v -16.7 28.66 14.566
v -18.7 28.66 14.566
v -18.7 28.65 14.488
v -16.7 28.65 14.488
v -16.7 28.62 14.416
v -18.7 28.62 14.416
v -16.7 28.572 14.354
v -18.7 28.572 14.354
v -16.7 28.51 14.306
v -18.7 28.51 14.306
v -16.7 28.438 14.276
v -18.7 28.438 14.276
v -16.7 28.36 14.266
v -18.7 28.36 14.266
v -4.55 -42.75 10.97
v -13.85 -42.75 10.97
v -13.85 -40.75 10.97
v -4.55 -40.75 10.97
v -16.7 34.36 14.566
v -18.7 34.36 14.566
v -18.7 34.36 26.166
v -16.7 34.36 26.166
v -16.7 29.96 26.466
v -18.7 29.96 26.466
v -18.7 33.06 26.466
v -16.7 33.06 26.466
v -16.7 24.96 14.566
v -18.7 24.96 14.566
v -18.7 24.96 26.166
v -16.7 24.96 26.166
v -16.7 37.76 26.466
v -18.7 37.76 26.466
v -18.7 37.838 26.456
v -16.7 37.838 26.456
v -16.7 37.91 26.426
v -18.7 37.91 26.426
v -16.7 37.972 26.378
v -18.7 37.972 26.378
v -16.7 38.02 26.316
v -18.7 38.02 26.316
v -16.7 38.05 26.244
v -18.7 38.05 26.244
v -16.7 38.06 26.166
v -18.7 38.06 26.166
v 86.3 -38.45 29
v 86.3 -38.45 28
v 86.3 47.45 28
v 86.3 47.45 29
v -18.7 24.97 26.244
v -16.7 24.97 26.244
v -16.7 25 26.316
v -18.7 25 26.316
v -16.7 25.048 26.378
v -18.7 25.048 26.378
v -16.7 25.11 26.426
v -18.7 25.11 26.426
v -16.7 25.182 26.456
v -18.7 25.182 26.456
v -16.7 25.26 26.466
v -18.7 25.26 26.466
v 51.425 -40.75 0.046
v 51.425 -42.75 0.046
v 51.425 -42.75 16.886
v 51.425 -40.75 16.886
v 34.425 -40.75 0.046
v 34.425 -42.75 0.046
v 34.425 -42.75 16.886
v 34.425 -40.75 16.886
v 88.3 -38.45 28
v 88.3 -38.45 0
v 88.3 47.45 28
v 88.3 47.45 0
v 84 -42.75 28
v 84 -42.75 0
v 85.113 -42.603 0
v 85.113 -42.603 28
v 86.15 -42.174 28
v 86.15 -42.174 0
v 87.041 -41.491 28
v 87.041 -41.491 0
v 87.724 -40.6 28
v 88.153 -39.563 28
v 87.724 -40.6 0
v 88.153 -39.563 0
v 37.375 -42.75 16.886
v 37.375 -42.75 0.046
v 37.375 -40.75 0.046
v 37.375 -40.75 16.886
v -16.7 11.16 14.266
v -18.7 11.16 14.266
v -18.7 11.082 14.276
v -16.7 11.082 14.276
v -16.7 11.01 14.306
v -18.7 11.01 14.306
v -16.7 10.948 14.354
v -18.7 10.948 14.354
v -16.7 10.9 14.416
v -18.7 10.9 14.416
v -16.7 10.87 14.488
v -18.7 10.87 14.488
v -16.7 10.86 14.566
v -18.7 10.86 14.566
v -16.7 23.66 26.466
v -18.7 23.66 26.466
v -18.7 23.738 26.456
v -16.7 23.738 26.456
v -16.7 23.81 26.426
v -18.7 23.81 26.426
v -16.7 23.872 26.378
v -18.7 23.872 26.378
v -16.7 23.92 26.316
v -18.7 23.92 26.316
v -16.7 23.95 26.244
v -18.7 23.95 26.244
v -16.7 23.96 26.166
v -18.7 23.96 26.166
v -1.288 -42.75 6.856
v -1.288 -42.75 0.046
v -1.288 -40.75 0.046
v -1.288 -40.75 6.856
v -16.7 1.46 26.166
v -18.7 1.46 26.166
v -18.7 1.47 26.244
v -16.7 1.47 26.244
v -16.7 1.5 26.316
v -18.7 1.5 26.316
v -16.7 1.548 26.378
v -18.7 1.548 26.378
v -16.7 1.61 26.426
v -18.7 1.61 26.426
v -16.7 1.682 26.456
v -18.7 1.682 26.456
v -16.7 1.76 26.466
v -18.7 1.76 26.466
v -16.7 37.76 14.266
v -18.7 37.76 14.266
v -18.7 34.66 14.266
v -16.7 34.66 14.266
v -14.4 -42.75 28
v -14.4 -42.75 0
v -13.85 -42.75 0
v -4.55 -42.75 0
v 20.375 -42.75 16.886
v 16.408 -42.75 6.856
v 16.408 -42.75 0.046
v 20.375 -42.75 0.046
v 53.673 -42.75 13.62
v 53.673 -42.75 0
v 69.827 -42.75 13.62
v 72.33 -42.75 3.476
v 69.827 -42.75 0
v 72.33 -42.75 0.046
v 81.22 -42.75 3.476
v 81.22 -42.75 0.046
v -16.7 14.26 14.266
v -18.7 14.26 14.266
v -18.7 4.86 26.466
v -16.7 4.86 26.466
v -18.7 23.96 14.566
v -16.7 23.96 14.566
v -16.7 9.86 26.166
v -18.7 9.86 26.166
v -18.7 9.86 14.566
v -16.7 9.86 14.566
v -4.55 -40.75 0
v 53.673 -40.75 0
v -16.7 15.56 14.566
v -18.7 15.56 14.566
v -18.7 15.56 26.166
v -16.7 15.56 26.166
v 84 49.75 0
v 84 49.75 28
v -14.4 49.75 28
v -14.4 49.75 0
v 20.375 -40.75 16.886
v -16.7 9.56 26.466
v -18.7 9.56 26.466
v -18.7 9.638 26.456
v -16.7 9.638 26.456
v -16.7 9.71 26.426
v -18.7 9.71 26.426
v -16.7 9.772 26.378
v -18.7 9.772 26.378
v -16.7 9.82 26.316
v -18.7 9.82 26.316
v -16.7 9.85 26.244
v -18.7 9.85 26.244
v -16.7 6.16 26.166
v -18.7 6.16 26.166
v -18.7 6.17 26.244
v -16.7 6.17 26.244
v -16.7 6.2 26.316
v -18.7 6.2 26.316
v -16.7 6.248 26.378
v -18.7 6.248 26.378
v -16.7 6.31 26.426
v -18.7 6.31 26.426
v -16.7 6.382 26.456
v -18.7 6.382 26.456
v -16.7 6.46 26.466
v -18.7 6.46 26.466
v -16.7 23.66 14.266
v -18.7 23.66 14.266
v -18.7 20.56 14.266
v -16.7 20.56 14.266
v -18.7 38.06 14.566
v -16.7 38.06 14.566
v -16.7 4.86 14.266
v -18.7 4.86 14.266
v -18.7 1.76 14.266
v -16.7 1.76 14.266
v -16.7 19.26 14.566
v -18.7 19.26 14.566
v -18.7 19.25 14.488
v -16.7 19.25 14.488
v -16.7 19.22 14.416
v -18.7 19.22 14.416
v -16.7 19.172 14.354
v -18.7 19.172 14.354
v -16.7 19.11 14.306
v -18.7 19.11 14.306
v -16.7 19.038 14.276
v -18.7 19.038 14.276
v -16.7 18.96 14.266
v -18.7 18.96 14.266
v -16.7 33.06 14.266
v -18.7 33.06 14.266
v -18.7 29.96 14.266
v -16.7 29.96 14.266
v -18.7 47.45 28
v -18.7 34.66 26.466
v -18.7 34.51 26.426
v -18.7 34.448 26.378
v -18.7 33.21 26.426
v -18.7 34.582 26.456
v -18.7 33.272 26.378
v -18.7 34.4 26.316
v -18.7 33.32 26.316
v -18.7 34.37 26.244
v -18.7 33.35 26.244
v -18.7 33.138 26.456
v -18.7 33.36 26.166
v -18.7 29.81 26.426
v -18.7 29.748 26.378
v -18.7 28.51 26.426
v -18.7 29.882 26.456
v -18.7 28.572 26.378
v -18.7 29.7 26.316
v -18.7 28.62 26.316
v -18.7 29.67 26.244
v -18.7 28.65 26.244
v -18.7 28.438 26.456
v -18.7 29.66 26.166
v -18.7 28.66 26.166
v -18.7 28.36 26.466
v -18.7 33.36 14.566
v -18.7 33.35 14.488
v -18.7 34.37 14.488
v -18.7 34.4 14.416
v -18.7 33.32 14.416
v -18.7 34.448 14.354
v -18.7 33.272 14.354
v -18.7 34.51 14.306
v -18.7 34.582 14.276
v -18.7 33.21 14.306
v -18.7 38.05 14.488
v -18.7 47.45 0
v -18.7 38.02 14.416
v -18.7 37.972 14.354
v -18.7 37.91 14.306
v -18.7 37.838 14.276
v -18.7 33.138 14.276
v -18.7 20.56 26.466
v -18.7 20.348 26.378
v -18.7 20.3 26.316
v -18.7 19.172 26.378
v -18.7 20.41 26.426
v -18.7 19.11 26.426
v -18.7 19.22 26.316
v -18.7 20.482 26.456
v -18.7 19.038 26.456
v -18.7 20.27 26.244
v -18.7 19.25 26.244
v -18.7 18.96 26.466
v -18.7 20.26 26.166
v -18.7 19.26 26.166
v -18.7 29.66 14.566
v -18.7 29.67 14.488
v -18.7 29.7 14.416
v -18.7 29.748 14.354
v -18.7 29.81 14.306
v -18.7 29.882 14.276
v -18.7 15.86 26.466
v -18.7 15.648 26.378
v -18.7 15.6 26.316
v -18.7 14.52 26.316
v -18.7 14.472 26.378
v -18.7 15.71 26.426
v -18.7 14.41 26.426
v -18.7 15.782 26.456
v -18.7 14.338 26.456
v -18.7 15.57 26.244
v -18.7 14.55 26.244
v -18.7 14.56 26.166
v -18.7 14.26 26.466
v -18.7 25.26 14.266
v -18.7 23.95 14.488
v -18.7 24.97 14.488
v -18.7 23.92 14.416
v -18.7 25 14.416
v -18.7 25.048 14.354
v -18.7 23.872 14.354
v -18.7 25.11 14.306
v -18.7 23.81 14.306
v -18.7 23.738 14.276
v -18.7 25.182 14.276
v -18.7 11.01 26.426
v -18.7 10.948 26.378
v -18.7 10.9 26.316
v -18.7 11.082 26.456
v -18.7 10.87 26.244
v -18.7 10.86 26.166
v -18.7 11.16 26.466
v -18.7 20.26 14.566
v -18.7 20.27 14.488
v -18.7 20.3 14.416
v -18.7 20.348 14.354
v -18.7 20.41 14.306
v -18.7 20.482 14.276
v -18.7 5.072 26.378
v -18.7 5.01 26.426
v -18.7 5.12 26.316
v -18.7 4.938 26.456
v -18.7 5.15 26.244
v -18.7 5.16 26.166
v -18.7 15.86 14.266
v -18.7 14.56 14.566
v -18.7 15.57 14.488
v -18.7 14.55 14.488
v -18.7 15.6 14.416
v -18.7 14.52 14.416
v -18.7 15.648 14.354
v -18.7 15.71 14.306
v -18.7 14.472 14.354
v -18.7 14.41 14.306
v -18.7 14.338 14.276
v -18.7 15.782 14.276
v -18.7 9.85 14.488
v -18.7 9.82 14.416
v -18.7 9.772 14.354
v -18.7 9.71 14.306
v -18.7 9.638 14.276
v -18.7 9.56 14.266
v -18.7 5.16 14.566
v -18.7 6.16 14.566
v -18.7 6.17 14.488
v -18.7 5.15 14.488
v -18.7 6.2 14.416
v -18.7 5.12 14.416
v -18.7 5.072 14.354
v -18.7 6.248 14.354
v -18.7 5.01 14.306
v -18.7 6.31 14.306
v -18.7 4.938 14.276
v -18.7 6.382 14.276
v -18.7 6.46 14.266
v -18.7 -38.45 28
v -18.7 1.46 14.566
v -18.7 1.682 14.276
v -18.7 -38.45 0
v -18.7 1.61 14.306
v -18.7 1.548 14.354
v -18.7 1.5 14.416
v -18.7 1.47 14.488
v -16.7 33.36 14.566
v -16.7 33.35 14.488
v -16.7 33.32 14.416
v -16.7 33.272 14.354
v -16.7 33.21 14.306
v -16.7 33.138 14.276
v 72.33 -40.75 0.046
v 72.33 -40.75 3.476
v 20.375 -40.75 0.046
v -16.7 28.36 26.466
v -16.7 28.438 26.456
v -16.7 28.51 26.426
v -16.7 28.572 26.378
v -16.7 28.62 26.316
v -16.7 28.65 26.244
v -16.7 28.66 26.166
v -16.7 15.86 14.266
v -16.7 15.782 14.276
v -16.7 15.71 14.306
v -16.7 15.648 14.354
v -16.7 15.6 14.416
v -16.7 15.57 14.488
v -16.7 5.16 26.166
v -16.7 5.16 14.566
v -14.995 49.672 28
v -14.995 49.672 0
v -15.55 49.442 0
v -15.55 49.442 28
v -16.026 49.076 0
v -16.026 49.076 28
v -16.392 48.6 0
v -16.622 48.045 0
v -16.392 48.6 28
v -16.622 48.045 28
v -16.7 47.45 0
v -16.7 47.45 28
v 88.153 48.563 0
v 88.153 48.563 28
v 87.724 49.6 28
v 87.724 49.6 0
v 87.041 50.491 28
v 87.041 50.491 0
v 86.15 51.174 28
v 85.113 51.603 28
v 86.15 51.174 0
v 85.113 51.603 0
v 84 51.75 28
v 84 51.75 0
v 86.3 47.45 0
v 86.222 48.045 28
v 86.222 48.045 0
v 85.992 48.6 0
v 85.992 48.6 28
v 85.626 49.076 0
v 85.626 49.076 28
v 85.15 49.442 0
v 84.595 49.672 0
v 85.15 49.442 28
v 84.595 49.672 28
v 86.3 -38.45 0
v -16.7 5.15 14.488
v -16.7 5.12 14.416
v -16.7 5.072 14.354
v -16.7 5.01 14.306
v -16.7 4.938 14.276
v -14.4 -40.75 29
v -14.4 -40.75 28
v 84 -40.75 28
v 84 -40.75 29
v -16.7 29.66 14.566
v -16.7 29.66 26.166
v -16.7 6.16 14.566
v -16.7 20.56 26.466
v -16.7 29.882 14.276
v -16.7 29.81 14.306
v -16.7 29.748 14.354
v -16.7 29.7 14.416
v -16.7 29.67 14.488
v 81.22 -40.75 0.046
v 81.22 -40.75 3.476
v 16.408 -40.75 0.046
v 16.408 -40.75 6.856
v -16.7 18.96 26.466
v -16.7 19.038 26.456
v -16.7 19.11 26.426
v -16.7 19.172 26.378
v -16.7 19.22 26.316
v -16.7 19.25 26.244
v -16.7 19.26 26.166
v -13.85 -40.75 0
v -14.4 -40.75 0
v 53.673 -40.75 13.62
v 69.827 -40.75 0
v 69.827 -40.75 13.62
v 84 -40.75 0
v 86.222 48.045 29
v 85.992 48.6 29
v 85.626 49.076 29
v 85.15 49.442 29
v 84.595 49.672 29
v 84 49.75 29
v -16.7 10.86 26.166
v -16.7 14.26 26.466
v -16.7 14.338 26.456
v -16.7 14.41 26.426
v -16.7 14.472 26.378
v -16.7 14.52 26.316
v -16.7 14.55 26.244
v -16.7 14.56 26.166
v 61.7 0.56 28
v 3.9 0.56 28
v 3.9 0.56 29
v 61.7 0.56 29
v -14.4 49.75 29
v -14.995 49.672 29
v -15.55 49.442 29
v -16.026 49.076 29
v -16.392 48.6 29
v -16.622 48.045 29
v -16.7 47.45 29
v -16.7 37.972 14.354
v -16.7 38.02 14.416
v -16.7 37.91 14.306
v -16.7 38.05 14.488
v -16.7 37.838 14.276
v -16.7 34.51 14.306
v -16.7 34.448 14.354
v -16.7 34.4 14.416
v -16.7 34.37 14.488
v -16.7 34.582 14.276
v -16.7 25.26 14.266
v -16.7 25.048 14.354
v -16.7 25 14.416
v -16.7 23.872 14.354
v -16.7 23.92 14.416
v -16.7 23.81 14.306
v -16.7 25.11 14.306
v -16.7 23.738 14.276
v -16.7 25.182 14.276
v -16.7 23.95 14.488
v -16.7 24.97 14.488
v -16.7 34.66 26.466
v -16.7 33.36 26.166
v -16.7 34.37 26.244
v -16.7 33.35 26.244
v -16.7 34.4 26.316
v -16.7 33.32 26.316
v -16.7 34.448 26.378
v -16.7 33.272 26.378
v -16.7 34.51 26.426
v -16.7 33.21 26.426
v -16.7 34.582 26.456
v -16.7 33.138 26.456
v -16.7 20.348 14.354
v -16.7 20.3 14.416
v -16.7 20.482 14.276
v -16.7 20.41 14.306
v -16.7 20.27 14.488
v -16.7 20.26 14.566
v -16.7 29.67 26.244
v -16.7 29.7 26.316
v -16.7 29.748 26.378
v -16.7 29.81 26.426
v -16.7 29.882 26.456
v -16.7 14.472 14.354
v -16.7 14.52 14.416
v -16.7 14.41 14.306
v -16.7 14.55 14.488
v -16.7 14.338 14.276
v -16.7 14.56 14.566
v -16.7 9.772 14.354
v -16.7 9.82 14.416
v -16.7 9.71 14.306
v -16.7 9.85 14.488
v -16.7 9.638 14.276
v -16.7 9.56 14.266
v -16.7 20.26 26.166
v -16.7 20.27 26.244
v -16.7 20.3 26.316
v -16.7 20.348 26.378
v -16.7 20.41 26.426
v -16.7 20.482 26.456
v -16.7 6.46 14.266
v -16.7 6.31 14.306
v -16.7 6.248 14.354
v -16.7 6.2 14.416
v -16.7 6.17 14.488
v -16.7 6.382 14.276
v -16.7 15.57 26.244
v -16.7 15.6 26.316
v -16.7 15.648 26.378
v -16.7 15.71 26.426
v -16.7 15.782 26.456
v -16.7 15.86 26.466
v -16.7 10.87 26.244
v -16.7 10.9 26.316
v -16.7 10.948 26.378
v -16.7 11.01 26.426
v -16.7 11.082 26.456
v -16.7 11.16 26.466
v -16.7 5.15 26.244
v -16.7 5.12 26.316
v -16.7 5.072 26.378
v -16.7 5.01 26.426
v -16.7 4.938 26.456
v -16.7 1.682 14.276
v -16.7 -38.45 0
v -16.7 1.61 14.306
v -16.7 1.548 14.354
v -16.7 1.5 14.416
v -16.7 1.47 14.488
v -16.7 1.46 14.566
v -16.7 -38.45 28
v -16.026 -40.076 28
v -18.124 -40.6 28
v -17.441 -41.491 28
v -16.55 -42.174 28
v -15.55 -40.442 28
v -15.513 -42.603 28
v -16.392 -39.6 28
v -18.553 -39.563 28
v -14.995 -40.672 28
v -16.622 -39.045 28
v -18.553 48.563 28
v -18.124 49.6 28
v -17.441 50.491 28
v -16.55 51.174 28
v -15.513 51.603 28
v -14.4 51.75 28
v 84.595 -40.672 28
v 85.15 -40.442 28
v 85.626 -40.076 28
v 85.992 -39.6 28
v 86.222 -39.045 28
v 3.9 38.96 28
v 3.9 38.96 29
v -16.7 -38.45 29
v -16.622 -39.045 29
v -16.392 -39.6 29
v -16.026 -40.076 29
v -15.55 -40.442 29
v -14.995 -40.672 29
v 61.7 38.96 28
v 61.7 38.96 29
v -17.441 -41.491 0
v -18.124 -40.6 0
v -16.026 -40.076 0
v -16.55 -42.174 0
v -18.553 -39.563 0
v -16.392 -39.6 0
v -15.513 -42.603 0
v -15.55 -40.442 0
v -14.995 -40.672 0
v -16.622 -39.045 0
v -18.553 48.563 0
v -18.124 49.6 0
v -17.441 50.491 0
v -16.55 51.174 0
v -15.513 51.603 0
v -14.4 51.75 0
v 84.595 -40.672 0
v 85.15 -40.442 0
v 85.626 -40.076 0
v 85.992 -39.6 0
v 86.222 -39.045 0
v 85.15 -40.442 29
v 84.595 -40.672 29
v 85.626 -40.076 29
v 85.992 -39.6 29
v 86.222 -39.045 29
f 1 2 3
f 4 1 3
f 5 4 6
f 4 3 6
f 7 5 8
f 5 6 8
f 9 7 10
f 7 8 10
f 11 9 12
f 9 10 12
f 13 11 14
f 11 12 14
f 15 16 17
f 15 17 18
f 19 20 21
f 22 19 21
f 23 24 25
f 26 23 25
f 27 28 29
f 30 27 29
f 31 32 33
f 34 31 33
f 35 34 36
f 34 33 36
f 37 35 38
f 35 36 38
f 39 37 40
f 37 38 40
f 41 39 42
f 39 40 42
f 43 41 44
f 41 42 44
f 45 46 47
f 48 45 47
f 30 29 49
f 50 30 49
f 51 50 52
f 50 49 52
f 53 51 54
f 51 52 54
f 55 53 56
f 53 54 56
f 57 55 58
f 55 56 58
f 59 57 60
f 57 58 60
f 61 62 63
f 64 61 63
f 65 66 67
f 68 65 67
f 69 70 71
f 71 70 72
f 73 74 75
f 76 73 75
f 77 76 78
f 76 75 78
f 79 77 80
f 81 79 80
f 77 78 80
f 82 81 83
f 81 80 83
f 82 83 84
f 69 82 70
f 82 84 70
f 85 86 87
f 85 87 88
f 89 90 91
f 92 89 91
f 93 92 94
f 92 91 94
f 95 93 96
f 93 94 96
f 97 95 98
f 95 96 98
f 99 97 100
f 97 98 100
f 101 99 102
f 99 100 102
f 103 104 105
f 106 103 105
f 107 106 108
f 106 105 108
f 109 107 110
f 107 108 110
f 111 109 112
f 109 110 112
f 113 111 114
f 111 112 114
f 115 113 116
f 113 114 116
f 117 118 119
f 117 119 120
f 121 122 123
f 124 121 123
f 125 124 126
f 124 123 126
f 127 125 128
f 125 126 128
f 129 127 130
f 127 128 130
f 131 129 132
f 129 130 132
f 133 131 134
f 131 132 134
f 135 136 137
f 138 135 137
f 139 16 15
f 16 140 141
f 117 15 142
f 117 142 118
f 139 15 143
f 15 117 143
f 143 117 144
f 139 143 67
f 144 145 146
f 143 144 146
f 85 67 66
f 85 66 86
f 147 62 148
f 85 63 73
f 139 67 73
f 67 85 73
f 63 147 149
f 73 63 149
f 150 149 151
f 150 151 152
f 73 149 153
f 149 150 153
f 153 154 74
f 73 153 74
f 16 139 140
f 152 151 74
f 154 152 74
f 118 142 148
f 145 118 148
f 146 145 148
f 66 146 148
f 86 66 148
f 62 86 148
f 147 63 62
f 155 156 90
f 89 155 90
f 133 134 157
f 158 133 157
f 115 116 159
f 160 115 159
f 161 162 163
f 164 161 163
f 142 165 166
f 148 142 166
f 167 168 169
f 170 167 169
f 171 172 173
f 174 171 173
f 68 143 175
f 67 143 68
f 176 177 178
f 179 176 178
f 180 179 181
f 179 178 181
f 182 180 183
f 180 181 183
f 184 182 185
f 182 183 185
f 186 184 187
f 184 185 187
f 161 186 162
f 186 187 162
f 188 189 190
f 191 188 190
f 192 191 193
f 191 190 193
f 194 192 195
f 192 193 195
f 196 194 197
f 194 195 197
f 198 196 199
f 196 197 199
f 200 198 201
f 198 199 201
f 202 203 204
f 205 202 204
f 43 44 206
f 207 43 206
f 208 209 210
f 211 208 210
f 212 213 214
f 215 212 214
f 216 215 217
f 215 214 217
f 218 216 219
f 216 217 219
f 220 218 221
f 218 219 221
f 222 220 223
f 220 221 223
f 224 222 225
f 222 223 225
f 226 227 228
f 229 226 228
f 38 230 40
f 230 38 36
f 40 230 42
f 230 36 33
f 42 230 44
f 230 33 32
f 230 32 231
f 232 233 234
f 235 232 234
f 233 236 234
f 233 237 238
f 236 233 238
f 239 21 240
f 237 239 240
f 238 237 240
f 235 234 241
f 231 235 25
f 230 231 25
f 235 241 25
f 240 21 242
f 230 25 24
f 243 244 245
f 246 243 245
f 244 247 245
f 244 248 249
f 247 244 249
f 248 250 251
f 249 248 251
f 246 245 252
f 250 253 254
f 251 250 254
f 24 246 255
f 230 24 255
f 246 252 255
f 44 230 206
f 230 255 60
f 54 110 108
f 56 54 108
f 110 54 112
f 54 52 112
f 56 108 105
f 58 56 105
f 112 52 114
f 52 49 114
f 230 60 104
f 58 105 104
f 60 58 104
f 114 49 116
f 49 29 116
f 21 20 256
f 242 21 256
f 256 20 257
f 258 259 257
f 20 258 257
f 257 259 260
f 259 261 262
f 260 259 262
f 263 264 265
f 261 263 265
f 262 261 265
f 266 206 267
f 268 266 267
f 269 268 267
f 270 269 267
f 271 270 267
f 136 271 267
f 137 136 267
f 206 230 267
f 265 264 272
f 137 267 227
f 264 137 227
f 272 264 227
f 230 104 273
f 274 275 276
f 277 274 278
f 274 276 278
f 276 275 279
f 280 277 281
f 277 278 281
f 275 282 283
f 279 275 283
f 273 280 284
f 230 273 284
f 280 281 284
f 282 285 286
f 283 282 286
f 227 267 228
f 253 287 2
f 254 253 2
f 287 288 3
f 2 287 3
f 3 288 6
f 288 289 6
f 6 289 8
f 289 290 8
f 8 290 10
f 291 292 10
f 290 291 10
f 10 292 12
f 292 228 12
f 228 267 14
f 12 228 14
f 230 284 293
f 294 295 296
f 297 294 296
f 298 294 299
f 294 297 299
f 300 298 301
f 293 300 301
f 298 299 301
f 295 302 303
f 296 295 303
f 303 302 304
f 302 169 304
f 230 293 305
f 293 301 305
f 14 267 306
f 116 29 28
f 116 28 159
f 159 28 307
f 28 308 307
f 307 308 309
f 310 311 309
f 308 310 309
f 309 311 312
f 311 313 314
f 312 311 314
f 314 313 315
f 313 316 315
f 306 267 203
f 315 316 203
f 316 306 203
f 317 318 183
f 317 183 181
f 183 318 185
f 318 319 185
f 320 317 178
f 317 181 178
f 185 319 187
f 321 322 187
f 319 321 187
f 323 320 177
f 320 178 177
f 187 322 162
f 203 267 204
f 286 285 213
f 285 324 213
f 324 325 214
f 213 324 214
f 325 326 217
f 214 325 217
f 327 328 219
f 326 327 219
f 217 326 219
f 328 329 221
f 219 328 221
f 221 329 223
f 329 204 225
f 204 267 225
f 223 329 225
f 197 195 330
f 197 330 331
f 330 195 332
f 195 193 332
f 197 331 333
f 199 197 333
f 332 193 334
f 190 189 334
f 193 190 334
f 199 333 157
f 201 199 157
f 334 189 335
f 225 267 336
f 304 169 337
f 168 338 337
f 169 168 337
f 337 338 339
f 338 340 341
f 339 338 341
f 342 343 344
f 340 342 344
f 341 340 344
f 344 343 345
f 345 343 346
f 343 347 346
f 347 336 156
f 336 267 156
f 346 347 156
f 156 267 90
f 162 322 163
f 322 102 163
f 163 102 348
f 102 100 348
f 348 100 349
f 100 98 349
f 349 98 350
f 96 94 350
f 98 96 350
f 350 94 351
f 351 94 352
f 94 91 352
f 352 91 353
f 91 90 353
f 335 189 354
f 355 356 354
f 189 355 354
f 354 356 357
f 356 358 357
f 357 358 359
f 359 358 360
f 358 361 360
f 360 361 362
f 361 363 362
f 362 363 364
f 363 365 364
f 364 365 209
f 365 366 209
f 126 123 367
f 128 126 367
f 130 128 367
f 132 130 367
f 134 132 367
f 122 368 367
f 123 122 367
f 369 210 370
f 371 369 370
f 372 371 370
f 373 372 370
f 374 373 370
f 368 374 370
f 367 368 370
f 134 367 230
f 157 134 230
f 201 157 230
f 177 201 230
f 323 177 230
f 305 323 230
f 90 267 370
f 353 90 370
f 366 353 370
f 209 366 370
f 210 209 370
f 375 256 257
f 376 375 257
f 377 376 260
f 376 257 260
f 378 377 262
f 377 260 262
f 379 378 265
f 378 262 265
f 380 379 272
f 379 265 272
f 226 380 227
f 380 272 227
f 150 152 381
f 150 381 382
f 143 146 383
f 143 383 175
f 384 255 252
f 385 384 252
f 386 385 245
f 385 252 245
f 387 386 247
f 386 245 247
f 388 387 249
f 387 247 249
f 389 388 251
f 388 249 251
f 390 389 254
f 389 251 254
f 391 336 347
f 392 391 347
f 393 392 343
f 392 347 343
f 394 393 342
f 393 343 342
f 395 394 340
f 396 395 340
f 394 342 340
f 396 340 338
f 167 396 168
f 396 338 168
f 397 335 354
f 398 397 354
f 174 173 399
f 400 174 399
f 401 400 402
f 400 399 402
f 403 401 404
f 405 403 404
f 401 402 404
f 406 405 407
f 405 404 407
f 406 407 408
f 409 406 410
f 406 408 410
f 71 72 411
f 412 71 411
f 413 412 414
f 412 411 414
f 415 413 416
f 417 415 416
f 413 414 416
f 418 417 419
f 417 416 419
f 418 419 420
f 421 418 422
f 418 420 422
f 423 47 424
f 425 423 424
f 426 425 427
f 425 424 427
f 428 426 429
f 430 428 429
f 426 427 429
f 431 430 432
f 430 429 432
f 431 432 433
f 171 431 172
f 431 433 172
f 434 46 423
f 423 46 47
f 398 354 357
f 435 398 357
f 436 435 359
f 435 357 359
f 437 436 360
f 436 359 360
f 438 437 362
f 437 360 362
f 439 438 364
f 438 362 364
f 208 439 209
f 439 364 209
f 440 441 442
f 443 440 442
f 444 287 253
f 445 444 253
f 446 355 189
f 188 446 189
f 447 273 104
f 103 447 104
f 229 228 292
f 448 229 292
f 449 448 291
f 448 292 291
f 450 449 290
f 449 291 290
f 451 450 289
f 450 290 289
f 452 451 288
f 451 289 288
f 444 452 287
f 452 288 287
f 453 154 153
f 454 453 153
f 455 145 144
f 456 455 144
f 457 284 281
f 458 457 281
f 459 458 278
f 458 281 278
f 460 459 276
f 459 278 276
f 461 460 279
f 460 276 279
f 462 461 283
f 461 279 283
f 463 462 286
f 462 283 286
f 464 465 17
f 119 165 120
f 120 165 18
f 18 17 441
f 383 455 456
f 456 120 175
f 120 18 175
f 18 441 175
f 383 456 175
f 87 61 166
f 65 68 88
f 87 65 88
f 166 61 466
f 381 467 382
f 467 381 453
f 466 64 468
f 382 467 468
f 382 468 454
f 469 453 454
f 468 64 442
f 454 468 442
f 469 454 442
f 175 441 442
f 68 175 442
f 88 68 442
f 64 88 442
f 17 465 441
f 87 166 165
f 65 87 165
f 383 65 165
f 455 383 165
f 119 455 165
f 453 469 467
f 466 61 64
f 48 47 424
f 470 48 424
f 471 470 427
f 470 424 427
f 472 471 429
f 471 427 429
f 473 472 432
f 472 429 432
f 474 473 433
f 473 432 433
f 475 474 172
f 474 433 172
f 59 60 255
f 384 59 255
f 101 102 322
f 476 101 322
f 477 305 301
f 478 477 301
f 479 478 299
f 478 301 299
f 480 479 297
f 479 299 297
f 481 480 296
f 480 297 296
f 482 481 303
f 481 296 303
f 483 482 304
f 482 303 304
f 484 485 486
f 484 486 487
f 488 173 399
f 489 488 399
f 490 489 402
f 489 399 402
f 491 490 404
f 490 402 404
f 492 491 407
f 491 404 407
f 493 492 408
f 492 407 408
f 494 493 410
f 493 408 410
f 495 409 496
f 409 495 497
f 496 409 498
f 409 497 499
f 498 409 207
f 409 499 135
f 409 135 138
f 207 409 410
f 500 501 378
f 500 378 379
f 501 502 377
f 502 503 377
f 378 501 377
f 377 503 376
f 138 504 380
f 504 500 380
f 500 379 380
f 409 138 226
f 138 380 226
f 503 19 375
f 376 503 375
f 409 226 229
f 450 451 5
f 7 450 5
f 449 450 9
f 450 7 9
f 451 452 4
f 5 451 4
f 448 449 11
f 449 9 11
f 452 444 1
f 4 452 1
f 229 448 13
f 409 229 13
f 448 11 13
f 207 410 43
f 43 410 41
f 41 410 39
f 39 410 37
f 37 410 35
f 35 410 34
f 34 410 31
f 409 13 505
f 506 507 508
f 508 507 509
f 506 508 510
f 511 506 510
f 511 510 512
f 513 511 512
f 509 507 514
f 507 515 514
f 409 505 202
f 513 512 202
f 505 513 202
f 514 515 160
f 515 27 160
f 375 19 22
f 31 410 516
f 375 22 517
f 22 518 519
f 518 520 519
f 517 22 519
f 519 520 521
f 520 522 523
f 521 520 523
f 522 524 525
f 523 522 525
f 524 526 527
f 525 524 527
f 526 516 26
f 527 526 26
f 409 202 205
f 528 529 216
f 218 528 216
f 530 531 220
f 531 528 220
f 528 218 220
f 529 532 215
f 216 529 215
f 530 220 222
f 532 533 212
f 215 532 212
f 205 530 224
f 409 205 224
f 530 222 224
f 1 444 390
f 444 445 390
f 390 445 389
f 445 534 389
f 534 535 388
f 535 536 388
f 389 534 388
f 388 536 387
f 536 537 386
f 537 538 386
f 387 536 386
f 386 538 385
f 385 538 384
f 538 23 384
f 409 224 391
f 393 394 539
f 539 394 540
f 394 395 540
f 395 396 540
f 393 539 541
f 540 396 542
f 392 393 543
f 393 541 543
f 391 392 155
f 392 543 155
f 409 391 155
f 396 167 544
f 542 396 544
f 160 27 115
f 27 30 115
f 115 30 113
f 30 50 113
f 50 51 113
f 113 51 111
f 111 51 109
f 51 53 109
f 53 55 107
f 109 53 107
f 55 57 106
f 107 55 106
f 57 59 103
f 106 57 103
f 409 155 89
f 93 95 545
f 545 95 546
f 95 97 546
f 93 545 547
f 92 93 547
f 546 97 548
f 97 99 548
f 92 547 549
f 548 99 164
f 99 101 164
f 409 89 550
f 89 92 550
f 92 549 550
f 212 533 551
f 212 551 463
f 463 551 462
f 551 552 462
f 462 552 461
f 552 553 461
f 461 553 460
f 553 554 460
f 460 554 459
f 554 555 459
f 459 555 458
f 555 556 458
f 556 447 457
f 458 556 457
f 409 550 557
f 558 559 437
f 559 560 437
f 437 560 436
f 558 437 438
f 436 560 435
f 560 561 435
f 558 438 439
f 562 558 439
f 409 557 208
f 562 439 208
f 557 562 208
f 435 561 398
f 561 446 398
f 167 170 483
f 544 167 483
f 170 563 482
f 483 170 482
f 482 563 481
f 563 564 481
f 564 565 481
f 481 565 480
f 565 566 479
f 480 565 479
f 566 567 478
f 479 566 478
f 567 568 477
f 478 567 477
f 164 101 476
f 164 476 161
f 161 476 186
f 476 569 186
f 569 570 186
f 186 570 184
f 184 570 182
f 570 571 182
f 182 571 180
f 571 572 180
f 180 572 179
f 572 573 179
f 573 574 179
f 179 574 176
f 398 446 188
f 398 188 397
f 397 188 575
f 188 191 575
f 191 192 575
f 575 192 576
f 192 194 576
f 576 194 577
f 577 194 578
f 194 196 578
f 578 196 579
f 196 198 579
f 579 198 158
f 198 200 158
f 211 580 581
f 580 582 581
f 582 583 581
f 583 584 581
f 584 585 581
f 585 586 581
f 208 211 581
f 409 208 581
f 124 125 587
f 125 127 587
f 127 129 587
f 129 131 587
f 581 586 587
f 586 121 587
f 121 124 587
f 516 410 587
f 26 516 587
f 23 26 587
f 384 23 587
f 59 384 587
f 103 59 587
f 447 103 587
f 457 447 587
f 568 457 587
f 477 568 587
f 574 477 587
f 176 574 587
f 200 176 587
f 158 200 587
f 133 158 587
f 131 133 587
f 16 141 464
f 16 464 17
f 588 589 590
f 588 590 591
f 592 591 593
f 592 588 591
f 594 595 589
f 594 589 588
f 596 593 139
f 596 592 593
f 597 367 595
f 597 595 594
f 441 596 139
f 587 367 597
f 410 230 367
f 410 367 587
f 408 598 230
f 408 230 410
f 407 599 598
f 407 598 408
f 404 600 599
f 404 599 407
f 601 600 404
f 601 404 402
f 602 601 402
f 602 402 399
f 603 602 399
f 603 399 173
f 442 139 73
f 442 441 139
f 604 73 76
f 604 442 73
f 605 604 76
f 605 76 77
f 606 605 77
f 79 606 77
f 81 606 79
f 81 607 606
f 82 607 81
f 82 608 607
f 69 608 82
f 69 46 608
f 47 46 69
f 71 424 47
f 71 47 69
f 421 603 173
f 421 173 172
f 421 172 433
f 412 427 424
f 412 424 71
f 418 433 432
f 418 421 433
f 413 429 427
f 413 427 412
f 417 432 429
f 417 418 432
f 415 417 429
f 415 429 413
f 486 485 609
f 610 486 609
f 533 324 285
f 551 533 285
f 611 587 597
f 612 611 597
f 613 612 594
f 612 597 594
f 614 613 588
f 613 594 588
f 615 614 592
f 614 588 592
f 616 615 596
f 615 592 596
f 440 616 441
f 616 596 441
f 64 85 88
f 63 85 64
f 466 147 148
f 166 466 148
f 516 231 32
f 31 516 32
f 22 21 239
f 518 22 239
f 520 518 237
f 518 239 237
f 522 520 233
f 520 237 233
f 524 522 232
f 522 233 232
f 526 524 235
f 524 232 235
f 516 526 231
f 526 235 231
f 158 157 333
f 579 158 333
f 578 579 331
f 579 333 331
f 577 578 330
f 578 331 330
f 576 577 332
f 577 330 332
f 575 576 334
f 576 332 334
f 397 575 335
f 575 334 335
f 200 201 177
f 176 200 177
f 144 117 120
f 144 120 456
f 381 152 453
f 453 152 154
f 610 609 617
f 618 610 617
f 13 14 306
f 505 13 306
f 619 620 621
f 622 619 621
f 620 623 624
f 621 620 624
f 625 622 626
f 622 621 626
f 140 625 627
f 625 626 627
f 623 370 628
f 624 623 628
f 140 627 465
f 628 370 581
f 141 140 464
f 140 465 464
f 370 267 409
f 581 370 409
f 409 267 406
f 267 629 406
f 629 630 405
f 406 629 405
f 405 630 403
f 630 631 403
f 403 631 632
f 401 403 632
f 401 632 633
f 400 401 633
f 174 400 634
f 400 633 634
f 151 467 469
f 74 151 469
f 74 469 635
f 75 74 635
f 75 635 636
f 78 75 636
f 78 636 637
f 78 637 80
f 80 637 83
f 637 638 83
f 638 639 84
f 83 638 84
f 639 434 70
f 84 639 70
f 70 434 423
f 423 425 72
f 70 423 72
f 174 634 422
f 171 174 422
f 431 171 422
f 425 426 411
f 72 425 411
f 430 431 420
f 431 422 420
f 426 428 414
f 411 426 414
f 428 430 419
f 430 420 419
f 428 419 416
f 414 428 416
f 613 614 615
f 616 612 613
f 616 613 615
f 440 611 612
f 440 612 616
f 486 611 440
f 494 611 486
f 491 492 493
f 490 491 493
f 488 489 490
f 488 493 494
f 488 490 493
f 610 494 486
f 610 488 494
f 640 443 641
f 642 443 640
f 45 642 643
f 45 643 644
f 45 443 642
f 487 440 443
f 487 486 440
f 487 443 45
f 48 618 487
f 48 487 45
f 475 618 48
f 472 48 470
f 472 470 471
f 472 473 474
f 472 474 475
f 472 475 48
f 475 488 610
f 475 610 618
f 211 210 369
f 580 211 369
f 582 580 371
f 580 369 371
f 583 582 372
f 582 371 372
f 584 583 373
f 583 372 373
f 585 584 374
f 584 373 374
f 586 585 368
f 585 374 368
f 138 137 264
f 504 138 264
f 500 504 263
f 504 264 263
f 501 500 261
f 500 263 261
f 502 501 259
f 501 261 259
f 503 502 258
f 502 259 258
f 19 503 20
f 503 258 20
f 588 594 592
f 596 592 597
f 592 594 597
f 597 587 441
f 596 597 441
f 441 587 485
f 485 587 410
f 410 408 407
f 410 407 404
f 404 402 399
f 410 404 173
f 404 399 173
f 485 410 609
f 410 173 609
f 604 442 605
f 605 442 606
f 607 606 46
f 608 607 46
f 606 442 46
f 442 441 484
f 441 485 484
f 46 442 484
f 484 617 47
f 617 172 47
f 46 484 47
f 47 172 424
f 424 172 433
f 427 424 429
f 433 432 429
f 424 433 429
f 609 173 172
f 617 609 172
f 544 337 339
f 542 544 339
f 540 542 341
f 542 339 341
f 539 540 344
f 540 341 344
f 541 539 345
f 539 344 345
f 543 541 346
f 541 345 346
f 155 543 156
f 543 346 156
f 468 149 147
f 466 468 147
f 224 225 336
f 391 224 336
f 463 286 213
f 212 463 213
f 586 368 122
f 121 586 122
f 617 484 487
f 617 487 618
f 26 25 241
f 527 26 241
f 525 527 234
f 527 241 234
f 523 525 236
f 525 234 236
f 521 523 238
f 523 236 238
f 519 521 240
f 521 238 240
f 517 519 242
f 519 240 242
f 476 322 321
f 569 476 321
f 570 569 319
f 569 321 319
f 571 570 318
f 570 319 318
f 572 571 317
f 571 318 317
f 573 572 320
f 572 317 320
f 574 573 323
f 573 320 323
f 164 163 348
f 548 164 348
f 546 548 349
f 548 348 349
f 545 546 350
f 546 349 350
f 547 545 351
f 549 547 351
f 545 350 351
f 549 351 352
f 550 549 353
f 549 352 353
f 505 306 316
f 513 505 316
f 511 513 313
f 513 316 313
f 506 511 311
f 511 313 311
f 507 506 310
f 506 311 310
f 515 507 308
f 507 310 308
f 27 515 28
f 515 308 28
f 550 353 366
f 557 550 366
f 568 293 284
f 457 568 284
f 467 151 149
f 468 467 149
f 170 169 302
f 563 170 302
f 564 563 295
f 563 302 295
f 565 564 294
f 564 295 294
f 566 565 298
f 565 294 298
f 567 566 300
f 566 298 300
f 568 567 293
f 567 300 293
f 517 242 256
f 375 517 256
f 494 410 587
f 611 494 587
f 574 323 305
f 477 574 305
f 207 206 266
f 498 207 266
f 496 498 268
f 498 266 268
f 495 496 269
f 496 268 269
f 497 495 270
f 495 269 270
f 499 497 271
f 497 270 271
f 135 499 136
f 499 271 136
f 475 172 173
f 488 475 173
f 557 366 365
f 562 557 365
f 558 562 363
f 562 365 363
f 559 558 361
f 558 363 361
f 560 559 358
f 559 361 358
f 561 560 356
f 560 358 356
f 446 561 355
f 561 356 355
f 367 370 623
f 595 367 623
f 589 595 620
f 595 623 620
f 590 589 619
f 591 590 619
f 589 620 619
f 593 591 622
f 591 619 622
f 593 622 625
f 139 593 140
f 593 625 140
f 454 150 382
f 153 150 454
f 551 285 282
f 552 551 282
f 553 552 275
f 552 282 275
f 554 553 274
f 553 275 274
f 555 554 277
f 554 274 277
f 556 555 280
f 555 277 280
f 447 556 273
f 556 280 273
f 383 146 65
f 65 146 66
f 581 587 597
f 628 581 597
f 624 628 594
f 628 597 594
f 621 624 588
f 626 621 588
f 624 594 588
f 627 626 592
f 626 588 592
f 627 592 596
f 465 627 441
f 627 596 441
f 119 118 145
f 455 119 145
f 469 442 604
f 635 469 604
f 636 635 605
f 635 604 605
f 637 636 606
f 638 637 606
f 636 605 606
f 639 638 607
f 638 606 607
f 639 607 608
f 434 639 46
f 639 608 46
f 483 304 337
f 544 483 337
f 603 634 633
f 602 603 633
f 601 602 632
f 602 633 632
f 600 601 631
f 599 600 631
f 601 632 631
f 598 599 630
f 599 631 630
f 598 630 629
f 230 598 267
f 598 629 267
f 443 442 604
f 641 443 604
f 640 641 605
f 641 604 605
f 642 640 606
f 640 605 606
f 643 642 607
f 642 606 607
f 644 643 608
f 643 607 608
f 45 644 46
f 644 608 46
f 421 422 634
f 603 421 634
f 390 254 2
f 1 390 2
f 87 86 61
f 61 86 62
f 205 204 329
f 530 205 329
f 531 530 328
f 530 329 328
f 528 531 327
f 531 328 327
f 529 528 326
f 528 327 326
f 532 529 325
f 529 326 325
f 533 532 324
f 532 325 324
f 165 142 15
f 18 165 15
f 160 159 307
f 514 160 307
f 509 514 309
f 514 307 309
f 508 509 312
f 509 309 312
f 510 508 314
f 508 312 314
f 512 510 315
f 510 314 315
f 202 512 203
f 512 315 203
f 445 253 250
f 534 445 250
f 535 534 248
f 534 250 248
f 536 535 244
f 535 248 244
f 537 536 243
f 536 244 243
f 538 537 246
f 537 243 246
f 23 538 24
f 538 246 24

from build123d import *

# Parameters (mm, degrees)
BOSS_EXTRUDE1_DEPTH = 28
SKETCH3_W           = 57.8
SKETCH3_H           = 38.4
BOSS_EXTRUDE2_DEPTH = 28
SKETCH4_W           = 9.3
SKETCH4_H           = 11
SKETCH4_W_2         = 17.696
SKETCH4_H_2         = 6.81
SKETCH4_W_3         = 8.89
SKETCH4_H_3         = 3.43
SKETCH4_W_4         = 14.05
SKETCH4_H_4         = 16.84
CUT_EXTRUDE1_DEPTH  = 2
CUT_EXTRUDE2_DEPTH  = 23
SKETCH6_W           = 57.8
SKETCH6_H           = 38.4
CUT_EXTRUDE5_DEPTH  = 28
SKETCH7_W           = 57.8
SKETCH7_H           = 38.4
BOSS_EXTRUDE3_DEPTH = 28
CUT_EXTRUDE7_DEPTH  = 27


with BuildPart() as part:
    # Sketch2 → Boss-Extrude1 (new body)
    with BuildSketch(Plane.XY):
        with BuildLine():
            Line((-18.7, 47.45), (-18.7, -38.45))
            ThreePointArc((-18.7, -38.45), (-17.440559159, -41.490559159), (-14.4, -42.75))
            Line((-14.4, -42.75), (84, -42.75))
            ThreePointArc((84, -42.75), (87.040559159, -41.490559159), (88.3, -38.45))
            Line((88.3, -38.45), (88.3, 47.45))
            ThreePointArc((88.3, 47.45), (87.040559159, 50.490559159), (84, 51.75))
            Line((84, 51.75), (-14.4, 51.75))
            ThreePointArc((-14.4, 51.75), (-17.440559159, 50.490559159), (-18.7, 47.45))
        make_face()
        with BuildLine():
            Line((84, 49.75), (-14.4, 49.75))
            ThreePointArc((-14.4, 49.75), (-16.026345597, 49.076345597), (-16.7, 47.45))
            Line((-16.7, 47.45), (-16.7, -38.45))
            ThreePointArc((-16.7, -38.45), (-16.026345597, -40.076345597), (-14.4, -40.75))
            Line((-14.4, -40.75), (84, -40.75))
            ThreePointArc((84, -40.75), (85.626345597, -40.076345597), (86.3, -38.45))
            Line((86.3, -38.45), (86.3, 47.45))
            ThreePointArc((86.3, 47.45), (85.626345597, 49.076345597), (84, 49.75))
        make_face(mode=Mode.SUBTRACT)
    extrude(amount=BOSS_EXTRUDE1_DEPTH)

    # Sketch3 → Boss-Extrude2 (add)
    with BuildSketch(Plane.XY):
        with BuildLine():
            Line((-18.7, 47.45), (-18.7, -38.45))
            ThreePointArc((-18.7, -38.45), (-17.440559159, -41.490559159), (-14.4, -42.75))
            Line((-14.4, -42.75), (84, -42.75))
            ThreePointArc((84, -42.75), (87.040559159, -41.490559159), (88.3, -38.45))
            Line((88.3, -38.45), (88.3, 47.45))
            ThreePointArc((88.3, 47.45), (87.040559159, 50.490559159), (84, 51.75))
            Line((84, 51.75), (-14.4, 51.75))
            ThreePointArc((-14.4, 51.75), (-17.440559159, 50.490559159), (-18.7, 47.45))
        make_face()
        with Locations((32.8, 19.76)):
            Rectangle(SKETCH3_W, SKETCH3_H, mode=Mode.SUBTRACT)
    extrude(amount=BOSS_EXTRUDE2_DEPTH)

    # Sketch4 → Cut-Extrude1 (cut)
    with BuildSketch(Plane.XZ.offset(42.75)):
        with Locations((-9.2, 5.47)):
            Rectangle(SKETCH4_W, SKETCH4_H)
        with Locations((7.56, 3.4512)):
            Rectangle(SKETCH4_W_2, SKETCH4_H_2)
        with Locations((76.775, 1.7612)):
            Rectangle(SKETCH4_W_3, SKETCH4_H_3)
        Polygon((66.12, -0.03), (68.12, -0.03), (69.827, -0.03), (69.827, 13.619992795), (68.12, 13.619992795), (66.12, 13.619992795), (57.38, 13.619992795), (55.38, 13.619992795), (53.673, 13.619992795), (53.673, -0.03), (55.38, -0.03), (57.38, -0.03), align=None)
        with Locations((44.4, 8.4662)):
            Rectangle(SKETCH4_W_4, SKETCH4_H_4)
        with Locations((27.4, 8.4662)):
            Rectangle(SKETCH4_W_4, SKETCH4_H_4)
    extrude(amount=-CUT_EXTRUDE1_DEPTH, mode=Mode.SUBTRACT)

    # Sketch5 → Cut-Extrude2 (cut)
    with BuildSketch(Plane.ZY.offset(18.7)):
        with BuildLine():
            Line((26.466, 1.76), (26.466, 4.86))
            ThreePointArc((26.466, 4.86), (26.378132034, 5.072132034), (26.166, 5.16))
            Line((26.166, 5.16), (14.566, 5.16))
            ThreePointArc((14.566, 5.16), (14.353867966, 5.072132034), (14.266, 4.86))
            Line((14.266, 4.86), (14.266, 1.76))
            ThreePointArc((14.266, 1.76), (14.353867966, 1.547867966), (14.566, 1.46))
            Line((14.566, 1.46), (26.166, 1.46))
            ThreePointArc((26.166, 1.46), (26.378132034, 1.547867966), (26.466, 1.76))
        make_face()
        with BuildLine():
            Line((26.166, 9.86), (14.566, 9.86))
            ThreePointArc((14.566, 9.86), (14.353867966, 9.772132034), (14.266, 9.56))
            Line((14.266, 9.56), (14.266, 6.46))
            ThreePointArc((14.266, 6.46), (14.353867966, 6.247867966), (14.566, 6.16))
            Line((14.566, 6.16), (26.166, 6.16))
            ThreePointArc((26.166, 6.16), (26.378132034, 6.247867966), (26.466, 6.46))
            Line((26.466, 6.46), (26.466, 9.56))
            ThreePointArc((26.466, 9.56), (26.378132034, 9.772132034), (26.166, 9.86))
        make_face()
        with BuildLine():
            Line((26.166, 14.56), (14.566, 14.56))
            ThreePointArc((14.566, 14.56), (14.353867966, 14.472132034), (14.266, 14.26))
            Line((14.266, 14.26), (14.266, 11.16))
            ThreePointArc((14.266, 11.16), (14.353867966, 10.947867966), (14.566, 10.86))
            Line((14.566, 10.86), (26.166, 10.86))
            ThreePointArc((26.166, 10.86), (26.378132034, 10.947867966), (26.466, 11.16))
            Line((26.466, 11.16), (26.466, 14.26))
            ThreePointArc((26.466, 14.26), (26.378132034, 14.472132034), (26.166, 14.56))
        make_face()
        with BuildLine():
            Line((26.166, 19.26), (14.566, 19.26))
            ThreePointArc((14.566, 19.26), (14.353867966, 19.172132034), (14.266, 18.96))
            Line((14.266, 18.96), (14.266, 15.86))
            ThreePointArc((14.266, 15.86), (14.353867966, 15.647867966), (14.566, 15.56))
            Line((14.566, 15.56), (26.166, 15.56))
            ThreePointArc((26.166, 15.56), (26.378132034, 15.647867966), (26.466, 15.86))
            Line((26.466, 15.86), (26.466, 18.96))
            ThreePointArc((26.466, 18.96), (26.378132034, 19.172132034), (26.166, 19.26))
        make_face()
        with BuildLine():
            Line((26.166, 23.96), (14.566, 23.96))
            ThreePointArc((14.566, 23.96), (14.353867966, 23.872132034), (14.266, 23.66))
            Line((14.266, 23.66), (14.266, 20.56))
            ThreePointArc((14.266, 20.56), (14.353867966, 20.347867966), (14.566, 20.26))
            Line((14.566, 20.26), (26.166, 20.26))
            ThreePointArc((26.166, 20.26), (26.378132034, 20.347867966), (26.466, 20.56))
            Line((26.466, 20.56), (26.466, 23.66))
            ThreePointArc((26.466, 23.66), (26.378132034, 23.872132034), (26.166, 23.96))
        make_face()
        with BuildLine():
            Line((26.166, 28.66), (14.566, 28.66))
            ThreePointArc((14.566, 28.66), (14.353867966, 28.572132034), (14.266, 28.36))
            Line((14.266, 28.36), (14.266, 25.26))
            ThreePointArc((14.266, 25.26), (14.353867966, 25.047867966), (14.566, 24.96))
            Line((14.566, 24.96), (26.166, 24.96))
            ThreePointArc((26.166, 24.96), (26.378132034, 25.047867966), (26.466, 25.26))
            Line((26.466, 25.26), (26.466, 28.36))
            ThreePointArc((26.466, 28.36), (26.378132034, 28.572132034), (26.166, 28.66))
        make_face()
        with BuildLine():
            Line((26.166, 33.36), (14.566, 33.36))
            ThreePointArc((14.566, 33.36), (14.353867966, 33.272132034), (14.266, 33.06))
            Line((14.266, 33.06), (14.266, 29.96))
            ThreePointArc((14.266, 29.96), (14.353867966, 29.747867966), (14.566, 29.66))
            Line((14.566, 29.66), (26.166, 29.66))
            ThreePointArc((26.166, 29.66), (26.378132034, 29.747867966), (26.466, 29.96))
            Line((26.466, 29.96), (26.466, 33.06))
            ThreePointArc((26.466, 33.06), (26.378132034, 33.272132034), (26.166, 33.36))
        make_face()
        with BuildLine():
            Line((26.166, 38.06), (14.566, 38.06))
            ThreePointArc((14.566, 38.06), (14.353867966, 37.972132034), (14.266, 37.76))
            Line((14.266, 37.76), (14.266, 34.66))
            ThreePointArc((14.266, 34.66), (14.353867966, 34.447867966), (14.566, 34.36))
            Line((14.566, 34.36), (26.166, 34.36))
            ThreePointArc((26.166, 34.36), (26.378132034, 34.447867966), (26.466, 34.66))
            Line((26.466, 34.66), (26.466, 37.76))
            ThreePointArc((26.466, 37.76), (26.378132034, 37.972132034), (26.166, 38.06))
        make_face()
    extrude(amount=-CUT_EXTRUDE2_DEPTH, mode=Mode.SUBTRACT)

    # Sketch6 → Cut-Extrude5 (cut)
    with BuildSketch(Plane.XY.offset(28)):
        with BuildLine():
            Line((84, 49.75), (-14.4, 49.75))
            ThreePointArc((-14.4, 49.75), (-16.026345597, 49.076345597), (-16.7, 47.45))
            Line((-16.7, 47.45), (-16.7, -38.45))
            ThreePointArc((-16.7, -38.45), (-16.026345597, -40.076345597), (-14.4, -40.75))
            Line((-14.4, -40.75), (84, -40.75))
            ThreePointArc((84, -40.75), (85.626345597, -40.076345597), (86.3, -38.45))
            Line((86.3, -38.45), (86.3, 47.45))
            ThreePointArc((86.3, 47.45), (85.626345597, 49.076345597), (84, 49.75))
        make_face()
        with Locations((32.8, 19.76)):
            Rectangle(SKETCH6_W, SKETCH6_H, mode=Mode.SUBTRACT)
    extrude(amount=-CUT_EXTRUDE5_DEPTH, mode=Mode.SUBTRACT)


with BuildPart() as body_2:
    # Sketch7 → Boss-Extrude3 (new body)
    with BuildSketch(Plane.XY.offset(28)):
        with BuildLine():
            Line((86.3, -38.45), (86.3, 47.45))
            ThreePointArc((86.3, 47.45), (85.626345597, 49.076345597), (84, 49.75))
            Line((84, 49.75), (-14.4, 49.75))
            ThreePointArc((-14.4, 49.75), (-16.026345597, 49.076345597), (-16.7, 47.45))
            Line((-16.7, 47.45), (-16.7, -38.45))
            ThreePointArc((-16.7, -38.45), (-16.026345597, -40.076345597), (-14.4, -40.75))
            Line((-14.4, -40.75), (84, -40.75))
            ThreePointArc((84, -40.75), (85.626345597, -40.076345597), (86.3, -38.45))
        make_face()
        with Locations((32.8, 19.76)):
            Rectangle(SKETCH7_W, SKETCH7_H, mode=Mode.SUBTRACT)
    extrude(amount=BOSS_EXTRUDE3_DEPTH)

    # Sketch8 → Cut-Extrude7 (cut)
    with BuildSketch(Plane.XY.offset(56)):
        with BuildLine():
            Line((84, 49.75), (-14.4, 49.75))
            ThreePointArc((-14.4, 49.75), (-16.026345597, 49.076345597), (-16.7, 47.45))
            Line((-16.7, 47.45), (-16.7, -38.45))
            ThreePointArc((-16.7, -38.45), (-16.026345597, -40.076345597), (-14.4, -40.75))
            Line((-14.4, -40.75), (84, -40.75))
            ThreePointArc((84, -40.75), (85.626345597, -40.076345597), (86.3, -38.45))
            Line((86.3, -38.45), (86.3, 47.45))
            ThreePointArc((86.3, 47.45), (85.626345597, 49.076345597), (84, 49.75))
        make_face()
    extrude(amount=-CUT_EXTRUDE7_DEPTH, mode=Mode.SUBTRACT)


solid = Compound([part.part, body_2.part])
